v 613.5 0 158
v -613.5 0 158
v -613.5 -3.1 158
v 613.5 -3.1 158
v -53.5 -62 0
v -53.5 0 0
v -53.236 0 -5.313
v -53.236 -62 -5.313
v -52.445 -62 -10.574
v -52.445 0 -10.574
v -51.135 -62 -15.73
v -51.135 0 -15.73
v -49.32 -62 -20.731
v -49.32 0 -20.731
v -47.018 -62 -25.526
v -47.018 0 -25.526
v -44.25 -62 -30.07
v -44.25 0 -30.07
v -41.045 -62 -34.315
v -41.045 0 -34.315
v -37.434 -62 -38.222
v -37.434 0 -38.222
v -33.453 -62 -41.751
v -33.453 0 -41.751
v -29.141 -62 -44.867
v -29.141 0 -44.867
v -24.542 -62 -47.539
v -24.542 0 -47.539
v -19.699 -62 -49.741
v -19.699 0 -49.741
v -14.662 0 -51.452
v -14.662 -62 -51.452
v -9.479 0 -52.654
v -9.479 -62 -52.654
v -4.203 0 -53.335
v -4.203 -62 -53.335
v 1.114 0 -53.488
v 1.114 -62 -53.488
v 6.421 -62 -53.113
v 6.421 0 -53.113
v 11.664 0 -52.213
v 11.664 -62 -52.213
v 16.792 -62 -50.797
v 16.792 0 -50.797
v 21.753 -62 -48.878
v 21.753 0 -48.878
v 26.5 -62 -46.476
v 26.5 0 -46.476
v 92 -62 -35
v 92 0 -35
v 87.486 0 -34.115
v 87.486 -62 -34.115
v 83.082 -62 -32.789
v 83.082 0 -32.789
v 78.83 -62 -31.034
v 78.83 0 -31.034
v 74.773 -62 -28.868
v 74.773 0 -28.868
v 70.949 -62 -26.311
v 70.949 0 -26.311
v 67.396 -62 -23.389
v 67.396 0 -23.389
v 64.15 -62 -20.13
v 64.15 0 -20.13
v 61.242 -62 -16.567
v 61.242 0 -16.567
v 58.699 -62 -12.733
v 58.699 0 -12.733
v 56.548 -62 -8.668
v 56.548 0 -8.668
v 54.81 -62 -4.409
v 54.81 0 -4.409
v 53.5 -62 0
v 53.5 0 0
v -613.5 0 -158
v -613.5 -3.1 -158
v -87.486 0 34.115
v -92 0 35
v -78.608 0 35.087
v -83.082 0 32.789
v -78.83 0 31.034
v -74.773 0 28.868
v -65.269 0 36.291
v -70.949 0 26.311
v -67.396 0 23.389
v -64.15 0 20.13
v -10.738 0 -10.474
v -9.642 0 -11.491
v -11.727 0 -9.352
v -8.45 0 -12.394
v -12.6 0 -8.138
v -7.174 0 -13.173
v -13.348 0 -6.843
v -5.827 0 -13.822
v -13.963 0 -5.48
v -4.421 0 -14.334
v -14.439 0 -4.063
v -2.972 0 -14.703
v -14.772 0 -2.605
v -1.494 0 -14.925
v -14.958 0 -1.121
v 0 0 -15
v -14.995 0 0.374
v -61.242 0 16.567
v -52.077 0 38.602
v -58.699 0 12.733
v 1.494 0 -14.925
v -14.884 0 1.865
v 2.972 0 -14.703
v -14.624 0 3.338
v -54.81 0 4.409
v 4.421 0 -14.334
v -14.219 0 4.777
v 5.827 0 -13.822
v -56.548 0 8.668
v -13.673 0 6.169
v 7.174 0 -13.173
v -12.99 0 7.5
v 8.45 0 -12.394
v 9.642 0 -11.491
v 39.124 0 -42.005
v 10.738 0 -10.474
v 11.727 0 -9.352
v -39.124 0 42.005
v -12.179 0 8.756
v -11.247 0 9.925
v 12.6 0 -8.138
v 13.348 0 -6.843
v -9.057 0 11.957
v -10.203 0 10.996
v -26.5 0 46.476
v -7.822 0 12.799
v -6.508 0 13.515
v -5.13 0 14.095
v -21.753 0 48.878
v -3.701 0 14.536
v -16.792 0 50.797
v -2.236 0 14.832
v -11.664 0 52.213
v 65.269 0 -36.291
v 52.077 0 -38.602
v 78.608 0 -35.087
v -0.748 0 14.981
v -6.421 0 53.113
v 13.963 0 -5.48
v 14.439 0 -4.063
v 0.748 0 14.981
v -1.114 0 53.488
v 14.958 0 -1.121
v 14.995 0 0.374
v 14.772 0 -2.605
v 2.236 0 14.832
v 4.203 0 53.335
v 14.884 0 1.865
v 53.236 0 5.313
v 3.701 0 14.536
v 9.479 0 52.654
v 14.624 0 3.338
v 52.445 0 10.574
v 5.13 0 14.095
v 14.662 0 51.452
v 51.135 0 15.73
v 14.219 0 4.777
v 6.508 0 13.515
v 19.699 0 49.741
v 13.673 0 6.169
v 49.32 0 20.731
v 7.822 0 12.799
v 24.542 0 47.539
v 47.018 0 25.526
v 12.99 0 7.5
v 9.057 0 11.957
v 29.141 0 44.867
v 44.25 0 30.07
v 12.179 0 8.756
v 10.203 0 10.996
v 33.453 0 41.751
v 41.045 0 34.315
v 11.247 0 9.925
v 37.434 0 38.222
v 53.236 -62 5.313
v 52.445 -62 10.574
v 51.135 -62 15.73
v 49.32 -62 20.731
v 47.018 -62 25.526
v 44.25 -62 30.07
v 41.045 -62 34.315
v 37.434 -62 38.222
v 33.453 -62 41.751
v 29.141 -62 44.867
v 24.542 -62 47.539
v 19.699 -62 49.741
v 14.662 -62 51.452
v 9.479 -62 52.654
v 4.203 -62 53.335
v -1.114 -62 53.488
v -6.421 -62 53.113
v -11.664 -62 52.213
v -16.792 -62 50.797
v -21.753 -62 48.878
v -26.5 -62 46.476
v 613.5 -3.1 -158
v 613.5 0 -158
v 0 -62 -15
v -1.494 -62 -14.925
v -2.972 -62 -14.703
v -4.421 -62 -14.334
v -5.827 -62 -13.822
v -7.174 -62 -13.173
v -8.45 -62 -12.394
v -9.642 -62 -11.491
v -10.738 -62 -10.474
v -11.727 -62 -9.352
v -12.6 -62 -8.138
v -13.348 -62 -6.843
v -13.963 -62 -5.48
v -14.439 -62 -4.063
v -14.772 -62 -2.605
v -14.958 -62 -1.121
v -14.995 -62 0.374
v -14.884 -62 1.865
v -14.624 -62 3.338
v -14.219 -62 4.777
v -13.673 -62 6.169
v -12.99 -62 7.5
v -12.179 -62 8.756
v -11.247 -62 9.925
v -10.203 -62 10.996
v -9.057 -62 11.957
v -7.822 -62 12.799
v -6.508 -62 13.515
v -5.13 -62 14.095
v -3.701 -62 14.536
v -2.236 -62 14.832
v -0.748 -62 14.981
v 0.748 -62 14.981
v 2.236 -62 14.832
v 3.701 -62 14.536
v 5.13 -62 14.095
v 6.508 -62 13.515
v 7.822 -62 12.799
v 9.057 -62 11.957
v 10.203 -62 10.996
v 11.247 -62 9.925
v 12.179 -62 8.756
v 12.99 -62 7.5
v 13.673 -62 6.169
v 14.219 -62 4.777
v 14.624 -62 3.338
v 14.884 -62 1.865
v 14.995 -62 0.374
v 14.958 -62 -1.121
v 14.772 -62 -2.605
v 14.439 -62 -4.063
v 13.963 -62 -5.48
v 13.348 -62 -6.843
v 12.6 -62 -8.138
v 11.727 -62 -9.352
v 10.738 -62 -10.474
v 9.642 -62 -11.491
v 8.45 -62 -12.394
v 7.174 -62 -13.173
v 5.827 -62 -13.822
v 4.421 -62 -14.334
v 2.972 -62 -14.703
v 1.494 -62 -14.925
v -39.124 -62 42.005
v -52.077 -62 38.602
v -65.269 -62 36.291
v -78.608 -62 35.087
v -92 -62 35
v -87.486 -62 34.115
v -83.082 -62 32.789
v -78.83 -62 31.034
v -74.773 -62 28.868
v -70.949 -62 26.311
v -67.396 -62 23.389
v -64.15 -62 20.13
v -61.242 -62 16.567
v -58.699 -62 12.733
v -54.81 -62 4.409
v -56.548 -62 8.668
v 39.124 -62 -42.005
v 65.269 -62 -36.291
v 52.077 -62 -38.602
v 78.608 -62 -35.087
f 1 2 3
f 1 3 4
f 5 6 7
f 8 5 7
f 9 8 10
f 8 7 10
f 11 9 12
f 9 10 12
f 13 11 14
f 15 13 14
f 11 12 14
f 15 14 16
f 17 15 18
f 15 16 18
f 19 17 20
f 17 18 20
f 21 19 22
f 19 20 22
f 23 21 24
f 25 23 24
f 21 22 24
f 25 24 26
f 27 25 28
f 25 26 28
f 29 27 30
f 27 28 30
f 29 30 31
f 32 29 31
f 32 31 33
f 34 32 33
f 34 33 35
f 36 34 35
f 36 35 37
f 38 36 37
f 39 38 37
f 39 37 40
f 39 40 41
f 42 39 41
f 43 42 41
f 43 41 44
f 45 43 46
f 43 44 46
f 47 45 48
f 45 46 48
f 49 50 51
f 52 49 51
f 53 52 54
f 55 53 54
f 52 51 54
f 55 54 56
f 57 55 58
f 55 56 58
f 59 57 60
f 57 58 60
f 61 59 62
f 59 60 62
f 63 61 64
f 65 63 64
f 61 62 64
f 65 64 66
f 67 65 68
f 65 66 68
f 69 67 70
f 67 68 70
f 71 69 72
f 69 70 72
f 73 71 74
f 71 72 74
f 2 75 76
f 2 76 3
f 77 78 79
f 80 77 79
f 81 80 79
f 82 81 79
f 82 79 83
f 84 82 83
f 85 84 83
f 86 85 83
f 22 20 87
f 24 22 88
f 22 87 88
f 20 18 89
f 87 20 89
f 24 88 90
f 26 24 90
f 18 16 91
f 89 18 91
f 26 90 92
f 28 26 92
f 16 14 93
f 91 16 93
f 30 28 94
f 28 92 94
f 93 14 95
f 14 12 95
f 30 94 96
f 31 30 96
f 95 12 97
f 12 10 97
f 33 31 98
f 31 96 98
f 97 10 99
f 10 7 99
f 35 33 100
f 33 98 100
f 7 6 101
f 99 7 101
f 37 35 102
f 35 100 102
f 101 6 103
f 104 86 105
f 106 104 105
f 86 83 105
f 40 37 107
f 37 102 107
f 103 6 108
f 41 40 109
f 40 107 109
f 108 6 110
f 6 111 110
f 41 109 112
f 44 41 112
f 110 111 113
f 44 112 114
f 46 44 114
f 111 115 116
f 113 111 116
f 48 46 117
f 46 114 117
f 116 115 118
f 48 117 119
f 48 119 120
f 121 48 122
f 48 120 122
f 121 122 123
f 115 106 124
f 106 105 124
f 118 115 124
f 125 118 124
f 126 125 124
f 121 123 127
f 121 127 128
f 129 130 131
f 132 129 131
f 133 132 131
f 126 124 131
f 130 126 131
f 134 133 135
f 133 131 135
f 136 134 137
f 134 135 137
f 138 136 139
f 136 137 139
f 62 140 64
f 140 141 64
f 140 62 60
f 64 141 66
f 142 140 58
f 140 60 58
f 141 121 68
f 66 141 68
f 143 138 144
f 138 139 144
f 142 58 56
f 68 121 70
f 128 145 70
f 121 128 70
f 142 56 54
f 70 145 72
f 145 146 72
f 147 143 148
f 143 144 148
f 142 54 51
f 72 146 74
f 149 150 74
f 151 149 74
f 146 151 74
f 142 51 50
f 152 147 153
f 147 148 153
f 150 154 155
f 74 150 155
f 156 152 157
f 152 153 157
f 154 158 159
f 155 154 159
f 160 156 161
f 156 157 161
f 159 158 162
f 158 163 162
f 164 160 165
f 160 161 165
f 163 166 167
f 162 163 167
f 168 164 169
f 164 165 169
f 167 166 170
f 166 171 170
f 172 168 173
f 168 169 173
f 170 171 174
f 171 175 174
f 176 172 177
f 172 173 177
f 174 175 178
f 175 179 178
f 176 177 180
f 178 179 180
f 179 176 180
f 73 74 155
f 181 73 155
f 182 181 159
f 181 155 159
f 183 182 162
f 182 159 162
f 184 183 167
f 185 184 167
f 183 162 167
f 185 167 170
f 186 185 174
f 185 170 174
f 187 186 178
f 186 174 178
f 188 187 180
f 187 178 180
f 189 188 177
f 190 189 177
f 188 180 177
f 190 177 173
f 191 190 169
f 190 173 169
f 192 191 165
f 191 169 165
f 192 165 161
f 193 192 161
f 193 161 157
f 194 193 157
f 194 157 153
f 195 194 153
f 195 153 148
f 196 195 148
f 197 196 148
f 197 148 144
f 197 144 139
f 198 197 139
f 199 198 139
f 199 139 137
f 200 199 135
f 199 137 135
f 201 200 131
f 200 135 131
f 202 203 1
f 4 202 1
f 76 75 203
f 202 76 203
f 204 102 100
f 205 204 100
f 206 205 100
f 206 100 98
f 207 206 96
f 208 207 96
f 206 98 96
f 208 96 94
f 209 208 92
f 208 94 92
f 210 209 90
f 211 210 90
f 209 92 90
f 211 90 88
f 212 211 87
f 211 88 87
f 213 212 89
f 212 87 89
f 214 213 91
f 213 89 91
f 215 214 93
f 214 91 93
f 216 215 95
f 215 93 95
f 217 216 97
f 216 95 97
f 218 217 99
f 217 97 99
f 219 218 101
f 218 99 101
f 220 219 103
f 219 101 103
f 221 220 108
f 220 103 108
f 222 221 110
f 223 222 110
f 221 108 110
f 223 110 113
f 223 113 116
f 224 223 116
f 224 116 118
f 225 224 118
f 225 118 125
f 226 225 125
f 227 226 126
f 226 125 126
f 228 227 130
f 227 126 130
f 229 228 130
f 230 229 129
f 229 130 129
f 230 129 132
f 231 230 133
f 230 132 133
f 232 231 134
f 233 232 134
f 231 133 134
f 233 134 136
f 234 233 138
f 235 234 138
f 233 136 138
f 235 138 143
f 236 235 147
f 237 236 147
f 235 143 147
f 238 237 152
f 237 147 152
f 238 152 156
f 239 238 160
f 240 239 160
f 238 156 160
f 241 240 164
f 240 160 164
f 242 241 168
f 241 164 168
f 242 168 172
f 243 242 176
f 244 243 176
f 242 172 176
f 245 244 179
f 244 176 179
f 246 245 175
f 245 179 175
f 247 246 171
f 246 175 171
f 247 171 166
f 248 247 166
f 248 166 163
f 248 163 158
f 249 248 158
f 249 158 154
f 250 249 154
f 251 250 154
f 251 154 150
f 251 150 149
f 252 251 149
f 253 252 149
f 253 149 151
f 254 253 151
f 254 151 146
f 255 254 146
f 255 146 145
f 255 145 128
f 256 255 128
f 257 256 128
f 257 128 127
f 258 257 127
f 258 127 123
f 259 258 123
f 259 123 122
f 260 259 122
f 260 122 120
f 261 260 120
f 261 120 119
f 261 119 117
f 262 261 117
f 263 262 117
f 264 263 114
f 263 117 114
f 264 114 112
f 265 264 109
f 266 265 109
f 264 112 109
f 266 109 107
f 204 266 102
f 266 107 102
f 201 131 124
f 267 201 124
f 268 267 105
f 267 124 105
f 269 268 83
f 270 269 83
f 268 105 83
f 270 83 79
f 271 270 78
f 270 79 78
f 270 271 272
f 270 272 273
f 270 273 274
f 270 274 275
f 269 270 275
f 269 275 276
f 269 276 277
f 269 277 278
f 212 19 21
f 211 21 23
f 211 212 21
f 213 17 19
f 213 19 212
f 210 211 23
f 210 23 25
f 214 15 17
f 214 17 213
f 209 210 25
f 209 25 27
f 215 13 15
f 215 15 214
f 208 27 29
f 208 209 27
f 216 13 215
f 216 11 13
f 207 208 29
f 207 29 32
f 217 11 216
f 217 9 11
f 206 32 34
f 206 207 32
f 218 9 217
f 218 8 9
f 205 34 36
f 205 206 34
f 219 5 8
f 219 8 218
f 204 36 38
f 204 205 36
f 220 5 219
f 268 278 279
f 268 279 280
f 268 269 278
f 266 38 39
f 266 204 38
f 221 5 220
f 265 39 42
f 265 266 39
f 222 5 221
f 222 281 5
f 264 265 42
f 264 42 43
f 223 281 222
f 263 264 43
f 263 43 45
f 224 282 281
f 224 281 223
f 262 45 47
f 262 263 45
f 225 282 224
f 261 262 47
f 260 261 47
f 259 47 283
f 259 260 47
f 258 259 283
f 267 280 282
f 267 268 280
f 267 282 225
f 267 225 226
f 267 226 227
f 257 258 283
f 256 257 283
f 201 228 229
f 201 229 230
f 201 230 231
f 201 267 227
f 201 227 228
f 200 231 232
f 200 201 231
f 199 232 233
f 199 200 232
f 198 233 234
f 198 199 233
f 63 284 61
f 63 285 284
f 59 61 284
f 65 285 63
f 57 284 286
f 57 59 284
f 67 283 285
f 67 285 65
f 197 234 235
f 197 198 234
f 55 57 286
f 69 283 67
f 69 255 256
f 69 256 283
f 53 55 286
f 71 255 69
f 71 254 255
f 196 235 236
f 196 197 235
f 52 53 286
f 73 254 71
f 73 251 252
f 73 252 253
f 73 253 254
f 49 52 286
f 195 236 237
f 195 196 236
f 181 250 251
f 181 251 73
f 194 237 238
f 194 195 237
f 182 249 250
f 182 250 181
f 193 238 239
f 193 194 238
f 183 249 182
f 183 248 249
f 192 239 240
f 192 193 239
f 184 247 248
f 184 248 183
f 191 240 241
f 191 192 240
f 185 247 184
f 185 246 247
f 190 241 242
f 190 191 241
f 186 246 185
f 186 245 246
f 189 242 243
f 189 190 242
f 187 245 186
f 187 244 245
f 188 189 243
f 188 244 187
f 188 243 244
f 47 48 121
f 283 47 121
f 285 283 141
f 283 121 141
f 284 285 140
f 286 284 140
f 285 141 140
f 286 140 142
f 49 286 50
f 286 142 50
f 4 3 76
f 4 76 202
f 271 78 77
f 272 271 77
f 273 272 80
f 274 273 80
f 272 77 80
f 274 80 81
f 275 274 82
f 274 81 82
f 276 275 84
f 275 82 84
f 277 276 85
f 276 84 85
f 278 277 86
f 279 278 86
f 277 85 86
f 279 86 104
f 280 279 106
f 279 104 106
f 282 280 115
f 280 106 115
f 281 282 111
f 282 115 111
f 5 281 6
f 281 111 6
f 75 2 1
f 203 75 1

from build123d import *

# Parameters (mm, degrees)
F3_DEPTH = 62
F1_W     = 1227
F1_H     = 316
F4_DEPTH = 3.1


with BuildPart() as f3:
    # F0 (on Front) → F3 (new body, through all)
    with BuildSketch(Plane.XZ):
        with BuildLine():
            ThreePointArc((-92, 35), (-67.3964487266, 23.3889064007), (-53.5, 0))
            ThreePointArc((-53.5, 0), (-26.8747093008, -46.2601340249), (26.5, -46.4758001545))
            ThreePointArc((26.5, -46.4758001545), (58.6491573303, -37.3084925992), (92, -35))
            ThreePointArc((92, -35), (67.3964487266, -23.3889064007), (53.5, 0))
            ThreePointArc((53.5, 0), (26.8747093008, 46.2601340249), (-26.5, 46.4758001545))
            ThreePointArc((-26.5, 46.4758001545), (-58.6491573303, 37.3084925992), (-92, 35))
        make_face()
        with BuildLine():
            ThreePointArc((0, 46), (46, 0), (0, -46))
            ThreePointArc((0, -46), (-46, 0), (0, 46))
        make_face(mode=Mode.SUBTRACT)
        with BuildLine():
            ThreePointArc((0, 46), (-46, 0), (0, -46))
            ThreePointArc((0, -46), (46, 0), (0, 46))
        make_face()
        with BuildLine():
            ThreePointArc((0, 15), (15, 0), (0, -15))
            ThreePointArc((0, -15), (-15, 0), (0, 15))
        make_face(mode=Mode.SUBTRACT)
    extrude(amount=F3_DEPTH)


with BuildPart() as f4:
    # F1 (on Front) → F4 (new body)
    with BuildSketch(Plane.XZ):
        Rectangle(F1_W, F1_H)
    extrude(amount=F4_DEPTH)


solid = Compound([f3.part, f4.part])
